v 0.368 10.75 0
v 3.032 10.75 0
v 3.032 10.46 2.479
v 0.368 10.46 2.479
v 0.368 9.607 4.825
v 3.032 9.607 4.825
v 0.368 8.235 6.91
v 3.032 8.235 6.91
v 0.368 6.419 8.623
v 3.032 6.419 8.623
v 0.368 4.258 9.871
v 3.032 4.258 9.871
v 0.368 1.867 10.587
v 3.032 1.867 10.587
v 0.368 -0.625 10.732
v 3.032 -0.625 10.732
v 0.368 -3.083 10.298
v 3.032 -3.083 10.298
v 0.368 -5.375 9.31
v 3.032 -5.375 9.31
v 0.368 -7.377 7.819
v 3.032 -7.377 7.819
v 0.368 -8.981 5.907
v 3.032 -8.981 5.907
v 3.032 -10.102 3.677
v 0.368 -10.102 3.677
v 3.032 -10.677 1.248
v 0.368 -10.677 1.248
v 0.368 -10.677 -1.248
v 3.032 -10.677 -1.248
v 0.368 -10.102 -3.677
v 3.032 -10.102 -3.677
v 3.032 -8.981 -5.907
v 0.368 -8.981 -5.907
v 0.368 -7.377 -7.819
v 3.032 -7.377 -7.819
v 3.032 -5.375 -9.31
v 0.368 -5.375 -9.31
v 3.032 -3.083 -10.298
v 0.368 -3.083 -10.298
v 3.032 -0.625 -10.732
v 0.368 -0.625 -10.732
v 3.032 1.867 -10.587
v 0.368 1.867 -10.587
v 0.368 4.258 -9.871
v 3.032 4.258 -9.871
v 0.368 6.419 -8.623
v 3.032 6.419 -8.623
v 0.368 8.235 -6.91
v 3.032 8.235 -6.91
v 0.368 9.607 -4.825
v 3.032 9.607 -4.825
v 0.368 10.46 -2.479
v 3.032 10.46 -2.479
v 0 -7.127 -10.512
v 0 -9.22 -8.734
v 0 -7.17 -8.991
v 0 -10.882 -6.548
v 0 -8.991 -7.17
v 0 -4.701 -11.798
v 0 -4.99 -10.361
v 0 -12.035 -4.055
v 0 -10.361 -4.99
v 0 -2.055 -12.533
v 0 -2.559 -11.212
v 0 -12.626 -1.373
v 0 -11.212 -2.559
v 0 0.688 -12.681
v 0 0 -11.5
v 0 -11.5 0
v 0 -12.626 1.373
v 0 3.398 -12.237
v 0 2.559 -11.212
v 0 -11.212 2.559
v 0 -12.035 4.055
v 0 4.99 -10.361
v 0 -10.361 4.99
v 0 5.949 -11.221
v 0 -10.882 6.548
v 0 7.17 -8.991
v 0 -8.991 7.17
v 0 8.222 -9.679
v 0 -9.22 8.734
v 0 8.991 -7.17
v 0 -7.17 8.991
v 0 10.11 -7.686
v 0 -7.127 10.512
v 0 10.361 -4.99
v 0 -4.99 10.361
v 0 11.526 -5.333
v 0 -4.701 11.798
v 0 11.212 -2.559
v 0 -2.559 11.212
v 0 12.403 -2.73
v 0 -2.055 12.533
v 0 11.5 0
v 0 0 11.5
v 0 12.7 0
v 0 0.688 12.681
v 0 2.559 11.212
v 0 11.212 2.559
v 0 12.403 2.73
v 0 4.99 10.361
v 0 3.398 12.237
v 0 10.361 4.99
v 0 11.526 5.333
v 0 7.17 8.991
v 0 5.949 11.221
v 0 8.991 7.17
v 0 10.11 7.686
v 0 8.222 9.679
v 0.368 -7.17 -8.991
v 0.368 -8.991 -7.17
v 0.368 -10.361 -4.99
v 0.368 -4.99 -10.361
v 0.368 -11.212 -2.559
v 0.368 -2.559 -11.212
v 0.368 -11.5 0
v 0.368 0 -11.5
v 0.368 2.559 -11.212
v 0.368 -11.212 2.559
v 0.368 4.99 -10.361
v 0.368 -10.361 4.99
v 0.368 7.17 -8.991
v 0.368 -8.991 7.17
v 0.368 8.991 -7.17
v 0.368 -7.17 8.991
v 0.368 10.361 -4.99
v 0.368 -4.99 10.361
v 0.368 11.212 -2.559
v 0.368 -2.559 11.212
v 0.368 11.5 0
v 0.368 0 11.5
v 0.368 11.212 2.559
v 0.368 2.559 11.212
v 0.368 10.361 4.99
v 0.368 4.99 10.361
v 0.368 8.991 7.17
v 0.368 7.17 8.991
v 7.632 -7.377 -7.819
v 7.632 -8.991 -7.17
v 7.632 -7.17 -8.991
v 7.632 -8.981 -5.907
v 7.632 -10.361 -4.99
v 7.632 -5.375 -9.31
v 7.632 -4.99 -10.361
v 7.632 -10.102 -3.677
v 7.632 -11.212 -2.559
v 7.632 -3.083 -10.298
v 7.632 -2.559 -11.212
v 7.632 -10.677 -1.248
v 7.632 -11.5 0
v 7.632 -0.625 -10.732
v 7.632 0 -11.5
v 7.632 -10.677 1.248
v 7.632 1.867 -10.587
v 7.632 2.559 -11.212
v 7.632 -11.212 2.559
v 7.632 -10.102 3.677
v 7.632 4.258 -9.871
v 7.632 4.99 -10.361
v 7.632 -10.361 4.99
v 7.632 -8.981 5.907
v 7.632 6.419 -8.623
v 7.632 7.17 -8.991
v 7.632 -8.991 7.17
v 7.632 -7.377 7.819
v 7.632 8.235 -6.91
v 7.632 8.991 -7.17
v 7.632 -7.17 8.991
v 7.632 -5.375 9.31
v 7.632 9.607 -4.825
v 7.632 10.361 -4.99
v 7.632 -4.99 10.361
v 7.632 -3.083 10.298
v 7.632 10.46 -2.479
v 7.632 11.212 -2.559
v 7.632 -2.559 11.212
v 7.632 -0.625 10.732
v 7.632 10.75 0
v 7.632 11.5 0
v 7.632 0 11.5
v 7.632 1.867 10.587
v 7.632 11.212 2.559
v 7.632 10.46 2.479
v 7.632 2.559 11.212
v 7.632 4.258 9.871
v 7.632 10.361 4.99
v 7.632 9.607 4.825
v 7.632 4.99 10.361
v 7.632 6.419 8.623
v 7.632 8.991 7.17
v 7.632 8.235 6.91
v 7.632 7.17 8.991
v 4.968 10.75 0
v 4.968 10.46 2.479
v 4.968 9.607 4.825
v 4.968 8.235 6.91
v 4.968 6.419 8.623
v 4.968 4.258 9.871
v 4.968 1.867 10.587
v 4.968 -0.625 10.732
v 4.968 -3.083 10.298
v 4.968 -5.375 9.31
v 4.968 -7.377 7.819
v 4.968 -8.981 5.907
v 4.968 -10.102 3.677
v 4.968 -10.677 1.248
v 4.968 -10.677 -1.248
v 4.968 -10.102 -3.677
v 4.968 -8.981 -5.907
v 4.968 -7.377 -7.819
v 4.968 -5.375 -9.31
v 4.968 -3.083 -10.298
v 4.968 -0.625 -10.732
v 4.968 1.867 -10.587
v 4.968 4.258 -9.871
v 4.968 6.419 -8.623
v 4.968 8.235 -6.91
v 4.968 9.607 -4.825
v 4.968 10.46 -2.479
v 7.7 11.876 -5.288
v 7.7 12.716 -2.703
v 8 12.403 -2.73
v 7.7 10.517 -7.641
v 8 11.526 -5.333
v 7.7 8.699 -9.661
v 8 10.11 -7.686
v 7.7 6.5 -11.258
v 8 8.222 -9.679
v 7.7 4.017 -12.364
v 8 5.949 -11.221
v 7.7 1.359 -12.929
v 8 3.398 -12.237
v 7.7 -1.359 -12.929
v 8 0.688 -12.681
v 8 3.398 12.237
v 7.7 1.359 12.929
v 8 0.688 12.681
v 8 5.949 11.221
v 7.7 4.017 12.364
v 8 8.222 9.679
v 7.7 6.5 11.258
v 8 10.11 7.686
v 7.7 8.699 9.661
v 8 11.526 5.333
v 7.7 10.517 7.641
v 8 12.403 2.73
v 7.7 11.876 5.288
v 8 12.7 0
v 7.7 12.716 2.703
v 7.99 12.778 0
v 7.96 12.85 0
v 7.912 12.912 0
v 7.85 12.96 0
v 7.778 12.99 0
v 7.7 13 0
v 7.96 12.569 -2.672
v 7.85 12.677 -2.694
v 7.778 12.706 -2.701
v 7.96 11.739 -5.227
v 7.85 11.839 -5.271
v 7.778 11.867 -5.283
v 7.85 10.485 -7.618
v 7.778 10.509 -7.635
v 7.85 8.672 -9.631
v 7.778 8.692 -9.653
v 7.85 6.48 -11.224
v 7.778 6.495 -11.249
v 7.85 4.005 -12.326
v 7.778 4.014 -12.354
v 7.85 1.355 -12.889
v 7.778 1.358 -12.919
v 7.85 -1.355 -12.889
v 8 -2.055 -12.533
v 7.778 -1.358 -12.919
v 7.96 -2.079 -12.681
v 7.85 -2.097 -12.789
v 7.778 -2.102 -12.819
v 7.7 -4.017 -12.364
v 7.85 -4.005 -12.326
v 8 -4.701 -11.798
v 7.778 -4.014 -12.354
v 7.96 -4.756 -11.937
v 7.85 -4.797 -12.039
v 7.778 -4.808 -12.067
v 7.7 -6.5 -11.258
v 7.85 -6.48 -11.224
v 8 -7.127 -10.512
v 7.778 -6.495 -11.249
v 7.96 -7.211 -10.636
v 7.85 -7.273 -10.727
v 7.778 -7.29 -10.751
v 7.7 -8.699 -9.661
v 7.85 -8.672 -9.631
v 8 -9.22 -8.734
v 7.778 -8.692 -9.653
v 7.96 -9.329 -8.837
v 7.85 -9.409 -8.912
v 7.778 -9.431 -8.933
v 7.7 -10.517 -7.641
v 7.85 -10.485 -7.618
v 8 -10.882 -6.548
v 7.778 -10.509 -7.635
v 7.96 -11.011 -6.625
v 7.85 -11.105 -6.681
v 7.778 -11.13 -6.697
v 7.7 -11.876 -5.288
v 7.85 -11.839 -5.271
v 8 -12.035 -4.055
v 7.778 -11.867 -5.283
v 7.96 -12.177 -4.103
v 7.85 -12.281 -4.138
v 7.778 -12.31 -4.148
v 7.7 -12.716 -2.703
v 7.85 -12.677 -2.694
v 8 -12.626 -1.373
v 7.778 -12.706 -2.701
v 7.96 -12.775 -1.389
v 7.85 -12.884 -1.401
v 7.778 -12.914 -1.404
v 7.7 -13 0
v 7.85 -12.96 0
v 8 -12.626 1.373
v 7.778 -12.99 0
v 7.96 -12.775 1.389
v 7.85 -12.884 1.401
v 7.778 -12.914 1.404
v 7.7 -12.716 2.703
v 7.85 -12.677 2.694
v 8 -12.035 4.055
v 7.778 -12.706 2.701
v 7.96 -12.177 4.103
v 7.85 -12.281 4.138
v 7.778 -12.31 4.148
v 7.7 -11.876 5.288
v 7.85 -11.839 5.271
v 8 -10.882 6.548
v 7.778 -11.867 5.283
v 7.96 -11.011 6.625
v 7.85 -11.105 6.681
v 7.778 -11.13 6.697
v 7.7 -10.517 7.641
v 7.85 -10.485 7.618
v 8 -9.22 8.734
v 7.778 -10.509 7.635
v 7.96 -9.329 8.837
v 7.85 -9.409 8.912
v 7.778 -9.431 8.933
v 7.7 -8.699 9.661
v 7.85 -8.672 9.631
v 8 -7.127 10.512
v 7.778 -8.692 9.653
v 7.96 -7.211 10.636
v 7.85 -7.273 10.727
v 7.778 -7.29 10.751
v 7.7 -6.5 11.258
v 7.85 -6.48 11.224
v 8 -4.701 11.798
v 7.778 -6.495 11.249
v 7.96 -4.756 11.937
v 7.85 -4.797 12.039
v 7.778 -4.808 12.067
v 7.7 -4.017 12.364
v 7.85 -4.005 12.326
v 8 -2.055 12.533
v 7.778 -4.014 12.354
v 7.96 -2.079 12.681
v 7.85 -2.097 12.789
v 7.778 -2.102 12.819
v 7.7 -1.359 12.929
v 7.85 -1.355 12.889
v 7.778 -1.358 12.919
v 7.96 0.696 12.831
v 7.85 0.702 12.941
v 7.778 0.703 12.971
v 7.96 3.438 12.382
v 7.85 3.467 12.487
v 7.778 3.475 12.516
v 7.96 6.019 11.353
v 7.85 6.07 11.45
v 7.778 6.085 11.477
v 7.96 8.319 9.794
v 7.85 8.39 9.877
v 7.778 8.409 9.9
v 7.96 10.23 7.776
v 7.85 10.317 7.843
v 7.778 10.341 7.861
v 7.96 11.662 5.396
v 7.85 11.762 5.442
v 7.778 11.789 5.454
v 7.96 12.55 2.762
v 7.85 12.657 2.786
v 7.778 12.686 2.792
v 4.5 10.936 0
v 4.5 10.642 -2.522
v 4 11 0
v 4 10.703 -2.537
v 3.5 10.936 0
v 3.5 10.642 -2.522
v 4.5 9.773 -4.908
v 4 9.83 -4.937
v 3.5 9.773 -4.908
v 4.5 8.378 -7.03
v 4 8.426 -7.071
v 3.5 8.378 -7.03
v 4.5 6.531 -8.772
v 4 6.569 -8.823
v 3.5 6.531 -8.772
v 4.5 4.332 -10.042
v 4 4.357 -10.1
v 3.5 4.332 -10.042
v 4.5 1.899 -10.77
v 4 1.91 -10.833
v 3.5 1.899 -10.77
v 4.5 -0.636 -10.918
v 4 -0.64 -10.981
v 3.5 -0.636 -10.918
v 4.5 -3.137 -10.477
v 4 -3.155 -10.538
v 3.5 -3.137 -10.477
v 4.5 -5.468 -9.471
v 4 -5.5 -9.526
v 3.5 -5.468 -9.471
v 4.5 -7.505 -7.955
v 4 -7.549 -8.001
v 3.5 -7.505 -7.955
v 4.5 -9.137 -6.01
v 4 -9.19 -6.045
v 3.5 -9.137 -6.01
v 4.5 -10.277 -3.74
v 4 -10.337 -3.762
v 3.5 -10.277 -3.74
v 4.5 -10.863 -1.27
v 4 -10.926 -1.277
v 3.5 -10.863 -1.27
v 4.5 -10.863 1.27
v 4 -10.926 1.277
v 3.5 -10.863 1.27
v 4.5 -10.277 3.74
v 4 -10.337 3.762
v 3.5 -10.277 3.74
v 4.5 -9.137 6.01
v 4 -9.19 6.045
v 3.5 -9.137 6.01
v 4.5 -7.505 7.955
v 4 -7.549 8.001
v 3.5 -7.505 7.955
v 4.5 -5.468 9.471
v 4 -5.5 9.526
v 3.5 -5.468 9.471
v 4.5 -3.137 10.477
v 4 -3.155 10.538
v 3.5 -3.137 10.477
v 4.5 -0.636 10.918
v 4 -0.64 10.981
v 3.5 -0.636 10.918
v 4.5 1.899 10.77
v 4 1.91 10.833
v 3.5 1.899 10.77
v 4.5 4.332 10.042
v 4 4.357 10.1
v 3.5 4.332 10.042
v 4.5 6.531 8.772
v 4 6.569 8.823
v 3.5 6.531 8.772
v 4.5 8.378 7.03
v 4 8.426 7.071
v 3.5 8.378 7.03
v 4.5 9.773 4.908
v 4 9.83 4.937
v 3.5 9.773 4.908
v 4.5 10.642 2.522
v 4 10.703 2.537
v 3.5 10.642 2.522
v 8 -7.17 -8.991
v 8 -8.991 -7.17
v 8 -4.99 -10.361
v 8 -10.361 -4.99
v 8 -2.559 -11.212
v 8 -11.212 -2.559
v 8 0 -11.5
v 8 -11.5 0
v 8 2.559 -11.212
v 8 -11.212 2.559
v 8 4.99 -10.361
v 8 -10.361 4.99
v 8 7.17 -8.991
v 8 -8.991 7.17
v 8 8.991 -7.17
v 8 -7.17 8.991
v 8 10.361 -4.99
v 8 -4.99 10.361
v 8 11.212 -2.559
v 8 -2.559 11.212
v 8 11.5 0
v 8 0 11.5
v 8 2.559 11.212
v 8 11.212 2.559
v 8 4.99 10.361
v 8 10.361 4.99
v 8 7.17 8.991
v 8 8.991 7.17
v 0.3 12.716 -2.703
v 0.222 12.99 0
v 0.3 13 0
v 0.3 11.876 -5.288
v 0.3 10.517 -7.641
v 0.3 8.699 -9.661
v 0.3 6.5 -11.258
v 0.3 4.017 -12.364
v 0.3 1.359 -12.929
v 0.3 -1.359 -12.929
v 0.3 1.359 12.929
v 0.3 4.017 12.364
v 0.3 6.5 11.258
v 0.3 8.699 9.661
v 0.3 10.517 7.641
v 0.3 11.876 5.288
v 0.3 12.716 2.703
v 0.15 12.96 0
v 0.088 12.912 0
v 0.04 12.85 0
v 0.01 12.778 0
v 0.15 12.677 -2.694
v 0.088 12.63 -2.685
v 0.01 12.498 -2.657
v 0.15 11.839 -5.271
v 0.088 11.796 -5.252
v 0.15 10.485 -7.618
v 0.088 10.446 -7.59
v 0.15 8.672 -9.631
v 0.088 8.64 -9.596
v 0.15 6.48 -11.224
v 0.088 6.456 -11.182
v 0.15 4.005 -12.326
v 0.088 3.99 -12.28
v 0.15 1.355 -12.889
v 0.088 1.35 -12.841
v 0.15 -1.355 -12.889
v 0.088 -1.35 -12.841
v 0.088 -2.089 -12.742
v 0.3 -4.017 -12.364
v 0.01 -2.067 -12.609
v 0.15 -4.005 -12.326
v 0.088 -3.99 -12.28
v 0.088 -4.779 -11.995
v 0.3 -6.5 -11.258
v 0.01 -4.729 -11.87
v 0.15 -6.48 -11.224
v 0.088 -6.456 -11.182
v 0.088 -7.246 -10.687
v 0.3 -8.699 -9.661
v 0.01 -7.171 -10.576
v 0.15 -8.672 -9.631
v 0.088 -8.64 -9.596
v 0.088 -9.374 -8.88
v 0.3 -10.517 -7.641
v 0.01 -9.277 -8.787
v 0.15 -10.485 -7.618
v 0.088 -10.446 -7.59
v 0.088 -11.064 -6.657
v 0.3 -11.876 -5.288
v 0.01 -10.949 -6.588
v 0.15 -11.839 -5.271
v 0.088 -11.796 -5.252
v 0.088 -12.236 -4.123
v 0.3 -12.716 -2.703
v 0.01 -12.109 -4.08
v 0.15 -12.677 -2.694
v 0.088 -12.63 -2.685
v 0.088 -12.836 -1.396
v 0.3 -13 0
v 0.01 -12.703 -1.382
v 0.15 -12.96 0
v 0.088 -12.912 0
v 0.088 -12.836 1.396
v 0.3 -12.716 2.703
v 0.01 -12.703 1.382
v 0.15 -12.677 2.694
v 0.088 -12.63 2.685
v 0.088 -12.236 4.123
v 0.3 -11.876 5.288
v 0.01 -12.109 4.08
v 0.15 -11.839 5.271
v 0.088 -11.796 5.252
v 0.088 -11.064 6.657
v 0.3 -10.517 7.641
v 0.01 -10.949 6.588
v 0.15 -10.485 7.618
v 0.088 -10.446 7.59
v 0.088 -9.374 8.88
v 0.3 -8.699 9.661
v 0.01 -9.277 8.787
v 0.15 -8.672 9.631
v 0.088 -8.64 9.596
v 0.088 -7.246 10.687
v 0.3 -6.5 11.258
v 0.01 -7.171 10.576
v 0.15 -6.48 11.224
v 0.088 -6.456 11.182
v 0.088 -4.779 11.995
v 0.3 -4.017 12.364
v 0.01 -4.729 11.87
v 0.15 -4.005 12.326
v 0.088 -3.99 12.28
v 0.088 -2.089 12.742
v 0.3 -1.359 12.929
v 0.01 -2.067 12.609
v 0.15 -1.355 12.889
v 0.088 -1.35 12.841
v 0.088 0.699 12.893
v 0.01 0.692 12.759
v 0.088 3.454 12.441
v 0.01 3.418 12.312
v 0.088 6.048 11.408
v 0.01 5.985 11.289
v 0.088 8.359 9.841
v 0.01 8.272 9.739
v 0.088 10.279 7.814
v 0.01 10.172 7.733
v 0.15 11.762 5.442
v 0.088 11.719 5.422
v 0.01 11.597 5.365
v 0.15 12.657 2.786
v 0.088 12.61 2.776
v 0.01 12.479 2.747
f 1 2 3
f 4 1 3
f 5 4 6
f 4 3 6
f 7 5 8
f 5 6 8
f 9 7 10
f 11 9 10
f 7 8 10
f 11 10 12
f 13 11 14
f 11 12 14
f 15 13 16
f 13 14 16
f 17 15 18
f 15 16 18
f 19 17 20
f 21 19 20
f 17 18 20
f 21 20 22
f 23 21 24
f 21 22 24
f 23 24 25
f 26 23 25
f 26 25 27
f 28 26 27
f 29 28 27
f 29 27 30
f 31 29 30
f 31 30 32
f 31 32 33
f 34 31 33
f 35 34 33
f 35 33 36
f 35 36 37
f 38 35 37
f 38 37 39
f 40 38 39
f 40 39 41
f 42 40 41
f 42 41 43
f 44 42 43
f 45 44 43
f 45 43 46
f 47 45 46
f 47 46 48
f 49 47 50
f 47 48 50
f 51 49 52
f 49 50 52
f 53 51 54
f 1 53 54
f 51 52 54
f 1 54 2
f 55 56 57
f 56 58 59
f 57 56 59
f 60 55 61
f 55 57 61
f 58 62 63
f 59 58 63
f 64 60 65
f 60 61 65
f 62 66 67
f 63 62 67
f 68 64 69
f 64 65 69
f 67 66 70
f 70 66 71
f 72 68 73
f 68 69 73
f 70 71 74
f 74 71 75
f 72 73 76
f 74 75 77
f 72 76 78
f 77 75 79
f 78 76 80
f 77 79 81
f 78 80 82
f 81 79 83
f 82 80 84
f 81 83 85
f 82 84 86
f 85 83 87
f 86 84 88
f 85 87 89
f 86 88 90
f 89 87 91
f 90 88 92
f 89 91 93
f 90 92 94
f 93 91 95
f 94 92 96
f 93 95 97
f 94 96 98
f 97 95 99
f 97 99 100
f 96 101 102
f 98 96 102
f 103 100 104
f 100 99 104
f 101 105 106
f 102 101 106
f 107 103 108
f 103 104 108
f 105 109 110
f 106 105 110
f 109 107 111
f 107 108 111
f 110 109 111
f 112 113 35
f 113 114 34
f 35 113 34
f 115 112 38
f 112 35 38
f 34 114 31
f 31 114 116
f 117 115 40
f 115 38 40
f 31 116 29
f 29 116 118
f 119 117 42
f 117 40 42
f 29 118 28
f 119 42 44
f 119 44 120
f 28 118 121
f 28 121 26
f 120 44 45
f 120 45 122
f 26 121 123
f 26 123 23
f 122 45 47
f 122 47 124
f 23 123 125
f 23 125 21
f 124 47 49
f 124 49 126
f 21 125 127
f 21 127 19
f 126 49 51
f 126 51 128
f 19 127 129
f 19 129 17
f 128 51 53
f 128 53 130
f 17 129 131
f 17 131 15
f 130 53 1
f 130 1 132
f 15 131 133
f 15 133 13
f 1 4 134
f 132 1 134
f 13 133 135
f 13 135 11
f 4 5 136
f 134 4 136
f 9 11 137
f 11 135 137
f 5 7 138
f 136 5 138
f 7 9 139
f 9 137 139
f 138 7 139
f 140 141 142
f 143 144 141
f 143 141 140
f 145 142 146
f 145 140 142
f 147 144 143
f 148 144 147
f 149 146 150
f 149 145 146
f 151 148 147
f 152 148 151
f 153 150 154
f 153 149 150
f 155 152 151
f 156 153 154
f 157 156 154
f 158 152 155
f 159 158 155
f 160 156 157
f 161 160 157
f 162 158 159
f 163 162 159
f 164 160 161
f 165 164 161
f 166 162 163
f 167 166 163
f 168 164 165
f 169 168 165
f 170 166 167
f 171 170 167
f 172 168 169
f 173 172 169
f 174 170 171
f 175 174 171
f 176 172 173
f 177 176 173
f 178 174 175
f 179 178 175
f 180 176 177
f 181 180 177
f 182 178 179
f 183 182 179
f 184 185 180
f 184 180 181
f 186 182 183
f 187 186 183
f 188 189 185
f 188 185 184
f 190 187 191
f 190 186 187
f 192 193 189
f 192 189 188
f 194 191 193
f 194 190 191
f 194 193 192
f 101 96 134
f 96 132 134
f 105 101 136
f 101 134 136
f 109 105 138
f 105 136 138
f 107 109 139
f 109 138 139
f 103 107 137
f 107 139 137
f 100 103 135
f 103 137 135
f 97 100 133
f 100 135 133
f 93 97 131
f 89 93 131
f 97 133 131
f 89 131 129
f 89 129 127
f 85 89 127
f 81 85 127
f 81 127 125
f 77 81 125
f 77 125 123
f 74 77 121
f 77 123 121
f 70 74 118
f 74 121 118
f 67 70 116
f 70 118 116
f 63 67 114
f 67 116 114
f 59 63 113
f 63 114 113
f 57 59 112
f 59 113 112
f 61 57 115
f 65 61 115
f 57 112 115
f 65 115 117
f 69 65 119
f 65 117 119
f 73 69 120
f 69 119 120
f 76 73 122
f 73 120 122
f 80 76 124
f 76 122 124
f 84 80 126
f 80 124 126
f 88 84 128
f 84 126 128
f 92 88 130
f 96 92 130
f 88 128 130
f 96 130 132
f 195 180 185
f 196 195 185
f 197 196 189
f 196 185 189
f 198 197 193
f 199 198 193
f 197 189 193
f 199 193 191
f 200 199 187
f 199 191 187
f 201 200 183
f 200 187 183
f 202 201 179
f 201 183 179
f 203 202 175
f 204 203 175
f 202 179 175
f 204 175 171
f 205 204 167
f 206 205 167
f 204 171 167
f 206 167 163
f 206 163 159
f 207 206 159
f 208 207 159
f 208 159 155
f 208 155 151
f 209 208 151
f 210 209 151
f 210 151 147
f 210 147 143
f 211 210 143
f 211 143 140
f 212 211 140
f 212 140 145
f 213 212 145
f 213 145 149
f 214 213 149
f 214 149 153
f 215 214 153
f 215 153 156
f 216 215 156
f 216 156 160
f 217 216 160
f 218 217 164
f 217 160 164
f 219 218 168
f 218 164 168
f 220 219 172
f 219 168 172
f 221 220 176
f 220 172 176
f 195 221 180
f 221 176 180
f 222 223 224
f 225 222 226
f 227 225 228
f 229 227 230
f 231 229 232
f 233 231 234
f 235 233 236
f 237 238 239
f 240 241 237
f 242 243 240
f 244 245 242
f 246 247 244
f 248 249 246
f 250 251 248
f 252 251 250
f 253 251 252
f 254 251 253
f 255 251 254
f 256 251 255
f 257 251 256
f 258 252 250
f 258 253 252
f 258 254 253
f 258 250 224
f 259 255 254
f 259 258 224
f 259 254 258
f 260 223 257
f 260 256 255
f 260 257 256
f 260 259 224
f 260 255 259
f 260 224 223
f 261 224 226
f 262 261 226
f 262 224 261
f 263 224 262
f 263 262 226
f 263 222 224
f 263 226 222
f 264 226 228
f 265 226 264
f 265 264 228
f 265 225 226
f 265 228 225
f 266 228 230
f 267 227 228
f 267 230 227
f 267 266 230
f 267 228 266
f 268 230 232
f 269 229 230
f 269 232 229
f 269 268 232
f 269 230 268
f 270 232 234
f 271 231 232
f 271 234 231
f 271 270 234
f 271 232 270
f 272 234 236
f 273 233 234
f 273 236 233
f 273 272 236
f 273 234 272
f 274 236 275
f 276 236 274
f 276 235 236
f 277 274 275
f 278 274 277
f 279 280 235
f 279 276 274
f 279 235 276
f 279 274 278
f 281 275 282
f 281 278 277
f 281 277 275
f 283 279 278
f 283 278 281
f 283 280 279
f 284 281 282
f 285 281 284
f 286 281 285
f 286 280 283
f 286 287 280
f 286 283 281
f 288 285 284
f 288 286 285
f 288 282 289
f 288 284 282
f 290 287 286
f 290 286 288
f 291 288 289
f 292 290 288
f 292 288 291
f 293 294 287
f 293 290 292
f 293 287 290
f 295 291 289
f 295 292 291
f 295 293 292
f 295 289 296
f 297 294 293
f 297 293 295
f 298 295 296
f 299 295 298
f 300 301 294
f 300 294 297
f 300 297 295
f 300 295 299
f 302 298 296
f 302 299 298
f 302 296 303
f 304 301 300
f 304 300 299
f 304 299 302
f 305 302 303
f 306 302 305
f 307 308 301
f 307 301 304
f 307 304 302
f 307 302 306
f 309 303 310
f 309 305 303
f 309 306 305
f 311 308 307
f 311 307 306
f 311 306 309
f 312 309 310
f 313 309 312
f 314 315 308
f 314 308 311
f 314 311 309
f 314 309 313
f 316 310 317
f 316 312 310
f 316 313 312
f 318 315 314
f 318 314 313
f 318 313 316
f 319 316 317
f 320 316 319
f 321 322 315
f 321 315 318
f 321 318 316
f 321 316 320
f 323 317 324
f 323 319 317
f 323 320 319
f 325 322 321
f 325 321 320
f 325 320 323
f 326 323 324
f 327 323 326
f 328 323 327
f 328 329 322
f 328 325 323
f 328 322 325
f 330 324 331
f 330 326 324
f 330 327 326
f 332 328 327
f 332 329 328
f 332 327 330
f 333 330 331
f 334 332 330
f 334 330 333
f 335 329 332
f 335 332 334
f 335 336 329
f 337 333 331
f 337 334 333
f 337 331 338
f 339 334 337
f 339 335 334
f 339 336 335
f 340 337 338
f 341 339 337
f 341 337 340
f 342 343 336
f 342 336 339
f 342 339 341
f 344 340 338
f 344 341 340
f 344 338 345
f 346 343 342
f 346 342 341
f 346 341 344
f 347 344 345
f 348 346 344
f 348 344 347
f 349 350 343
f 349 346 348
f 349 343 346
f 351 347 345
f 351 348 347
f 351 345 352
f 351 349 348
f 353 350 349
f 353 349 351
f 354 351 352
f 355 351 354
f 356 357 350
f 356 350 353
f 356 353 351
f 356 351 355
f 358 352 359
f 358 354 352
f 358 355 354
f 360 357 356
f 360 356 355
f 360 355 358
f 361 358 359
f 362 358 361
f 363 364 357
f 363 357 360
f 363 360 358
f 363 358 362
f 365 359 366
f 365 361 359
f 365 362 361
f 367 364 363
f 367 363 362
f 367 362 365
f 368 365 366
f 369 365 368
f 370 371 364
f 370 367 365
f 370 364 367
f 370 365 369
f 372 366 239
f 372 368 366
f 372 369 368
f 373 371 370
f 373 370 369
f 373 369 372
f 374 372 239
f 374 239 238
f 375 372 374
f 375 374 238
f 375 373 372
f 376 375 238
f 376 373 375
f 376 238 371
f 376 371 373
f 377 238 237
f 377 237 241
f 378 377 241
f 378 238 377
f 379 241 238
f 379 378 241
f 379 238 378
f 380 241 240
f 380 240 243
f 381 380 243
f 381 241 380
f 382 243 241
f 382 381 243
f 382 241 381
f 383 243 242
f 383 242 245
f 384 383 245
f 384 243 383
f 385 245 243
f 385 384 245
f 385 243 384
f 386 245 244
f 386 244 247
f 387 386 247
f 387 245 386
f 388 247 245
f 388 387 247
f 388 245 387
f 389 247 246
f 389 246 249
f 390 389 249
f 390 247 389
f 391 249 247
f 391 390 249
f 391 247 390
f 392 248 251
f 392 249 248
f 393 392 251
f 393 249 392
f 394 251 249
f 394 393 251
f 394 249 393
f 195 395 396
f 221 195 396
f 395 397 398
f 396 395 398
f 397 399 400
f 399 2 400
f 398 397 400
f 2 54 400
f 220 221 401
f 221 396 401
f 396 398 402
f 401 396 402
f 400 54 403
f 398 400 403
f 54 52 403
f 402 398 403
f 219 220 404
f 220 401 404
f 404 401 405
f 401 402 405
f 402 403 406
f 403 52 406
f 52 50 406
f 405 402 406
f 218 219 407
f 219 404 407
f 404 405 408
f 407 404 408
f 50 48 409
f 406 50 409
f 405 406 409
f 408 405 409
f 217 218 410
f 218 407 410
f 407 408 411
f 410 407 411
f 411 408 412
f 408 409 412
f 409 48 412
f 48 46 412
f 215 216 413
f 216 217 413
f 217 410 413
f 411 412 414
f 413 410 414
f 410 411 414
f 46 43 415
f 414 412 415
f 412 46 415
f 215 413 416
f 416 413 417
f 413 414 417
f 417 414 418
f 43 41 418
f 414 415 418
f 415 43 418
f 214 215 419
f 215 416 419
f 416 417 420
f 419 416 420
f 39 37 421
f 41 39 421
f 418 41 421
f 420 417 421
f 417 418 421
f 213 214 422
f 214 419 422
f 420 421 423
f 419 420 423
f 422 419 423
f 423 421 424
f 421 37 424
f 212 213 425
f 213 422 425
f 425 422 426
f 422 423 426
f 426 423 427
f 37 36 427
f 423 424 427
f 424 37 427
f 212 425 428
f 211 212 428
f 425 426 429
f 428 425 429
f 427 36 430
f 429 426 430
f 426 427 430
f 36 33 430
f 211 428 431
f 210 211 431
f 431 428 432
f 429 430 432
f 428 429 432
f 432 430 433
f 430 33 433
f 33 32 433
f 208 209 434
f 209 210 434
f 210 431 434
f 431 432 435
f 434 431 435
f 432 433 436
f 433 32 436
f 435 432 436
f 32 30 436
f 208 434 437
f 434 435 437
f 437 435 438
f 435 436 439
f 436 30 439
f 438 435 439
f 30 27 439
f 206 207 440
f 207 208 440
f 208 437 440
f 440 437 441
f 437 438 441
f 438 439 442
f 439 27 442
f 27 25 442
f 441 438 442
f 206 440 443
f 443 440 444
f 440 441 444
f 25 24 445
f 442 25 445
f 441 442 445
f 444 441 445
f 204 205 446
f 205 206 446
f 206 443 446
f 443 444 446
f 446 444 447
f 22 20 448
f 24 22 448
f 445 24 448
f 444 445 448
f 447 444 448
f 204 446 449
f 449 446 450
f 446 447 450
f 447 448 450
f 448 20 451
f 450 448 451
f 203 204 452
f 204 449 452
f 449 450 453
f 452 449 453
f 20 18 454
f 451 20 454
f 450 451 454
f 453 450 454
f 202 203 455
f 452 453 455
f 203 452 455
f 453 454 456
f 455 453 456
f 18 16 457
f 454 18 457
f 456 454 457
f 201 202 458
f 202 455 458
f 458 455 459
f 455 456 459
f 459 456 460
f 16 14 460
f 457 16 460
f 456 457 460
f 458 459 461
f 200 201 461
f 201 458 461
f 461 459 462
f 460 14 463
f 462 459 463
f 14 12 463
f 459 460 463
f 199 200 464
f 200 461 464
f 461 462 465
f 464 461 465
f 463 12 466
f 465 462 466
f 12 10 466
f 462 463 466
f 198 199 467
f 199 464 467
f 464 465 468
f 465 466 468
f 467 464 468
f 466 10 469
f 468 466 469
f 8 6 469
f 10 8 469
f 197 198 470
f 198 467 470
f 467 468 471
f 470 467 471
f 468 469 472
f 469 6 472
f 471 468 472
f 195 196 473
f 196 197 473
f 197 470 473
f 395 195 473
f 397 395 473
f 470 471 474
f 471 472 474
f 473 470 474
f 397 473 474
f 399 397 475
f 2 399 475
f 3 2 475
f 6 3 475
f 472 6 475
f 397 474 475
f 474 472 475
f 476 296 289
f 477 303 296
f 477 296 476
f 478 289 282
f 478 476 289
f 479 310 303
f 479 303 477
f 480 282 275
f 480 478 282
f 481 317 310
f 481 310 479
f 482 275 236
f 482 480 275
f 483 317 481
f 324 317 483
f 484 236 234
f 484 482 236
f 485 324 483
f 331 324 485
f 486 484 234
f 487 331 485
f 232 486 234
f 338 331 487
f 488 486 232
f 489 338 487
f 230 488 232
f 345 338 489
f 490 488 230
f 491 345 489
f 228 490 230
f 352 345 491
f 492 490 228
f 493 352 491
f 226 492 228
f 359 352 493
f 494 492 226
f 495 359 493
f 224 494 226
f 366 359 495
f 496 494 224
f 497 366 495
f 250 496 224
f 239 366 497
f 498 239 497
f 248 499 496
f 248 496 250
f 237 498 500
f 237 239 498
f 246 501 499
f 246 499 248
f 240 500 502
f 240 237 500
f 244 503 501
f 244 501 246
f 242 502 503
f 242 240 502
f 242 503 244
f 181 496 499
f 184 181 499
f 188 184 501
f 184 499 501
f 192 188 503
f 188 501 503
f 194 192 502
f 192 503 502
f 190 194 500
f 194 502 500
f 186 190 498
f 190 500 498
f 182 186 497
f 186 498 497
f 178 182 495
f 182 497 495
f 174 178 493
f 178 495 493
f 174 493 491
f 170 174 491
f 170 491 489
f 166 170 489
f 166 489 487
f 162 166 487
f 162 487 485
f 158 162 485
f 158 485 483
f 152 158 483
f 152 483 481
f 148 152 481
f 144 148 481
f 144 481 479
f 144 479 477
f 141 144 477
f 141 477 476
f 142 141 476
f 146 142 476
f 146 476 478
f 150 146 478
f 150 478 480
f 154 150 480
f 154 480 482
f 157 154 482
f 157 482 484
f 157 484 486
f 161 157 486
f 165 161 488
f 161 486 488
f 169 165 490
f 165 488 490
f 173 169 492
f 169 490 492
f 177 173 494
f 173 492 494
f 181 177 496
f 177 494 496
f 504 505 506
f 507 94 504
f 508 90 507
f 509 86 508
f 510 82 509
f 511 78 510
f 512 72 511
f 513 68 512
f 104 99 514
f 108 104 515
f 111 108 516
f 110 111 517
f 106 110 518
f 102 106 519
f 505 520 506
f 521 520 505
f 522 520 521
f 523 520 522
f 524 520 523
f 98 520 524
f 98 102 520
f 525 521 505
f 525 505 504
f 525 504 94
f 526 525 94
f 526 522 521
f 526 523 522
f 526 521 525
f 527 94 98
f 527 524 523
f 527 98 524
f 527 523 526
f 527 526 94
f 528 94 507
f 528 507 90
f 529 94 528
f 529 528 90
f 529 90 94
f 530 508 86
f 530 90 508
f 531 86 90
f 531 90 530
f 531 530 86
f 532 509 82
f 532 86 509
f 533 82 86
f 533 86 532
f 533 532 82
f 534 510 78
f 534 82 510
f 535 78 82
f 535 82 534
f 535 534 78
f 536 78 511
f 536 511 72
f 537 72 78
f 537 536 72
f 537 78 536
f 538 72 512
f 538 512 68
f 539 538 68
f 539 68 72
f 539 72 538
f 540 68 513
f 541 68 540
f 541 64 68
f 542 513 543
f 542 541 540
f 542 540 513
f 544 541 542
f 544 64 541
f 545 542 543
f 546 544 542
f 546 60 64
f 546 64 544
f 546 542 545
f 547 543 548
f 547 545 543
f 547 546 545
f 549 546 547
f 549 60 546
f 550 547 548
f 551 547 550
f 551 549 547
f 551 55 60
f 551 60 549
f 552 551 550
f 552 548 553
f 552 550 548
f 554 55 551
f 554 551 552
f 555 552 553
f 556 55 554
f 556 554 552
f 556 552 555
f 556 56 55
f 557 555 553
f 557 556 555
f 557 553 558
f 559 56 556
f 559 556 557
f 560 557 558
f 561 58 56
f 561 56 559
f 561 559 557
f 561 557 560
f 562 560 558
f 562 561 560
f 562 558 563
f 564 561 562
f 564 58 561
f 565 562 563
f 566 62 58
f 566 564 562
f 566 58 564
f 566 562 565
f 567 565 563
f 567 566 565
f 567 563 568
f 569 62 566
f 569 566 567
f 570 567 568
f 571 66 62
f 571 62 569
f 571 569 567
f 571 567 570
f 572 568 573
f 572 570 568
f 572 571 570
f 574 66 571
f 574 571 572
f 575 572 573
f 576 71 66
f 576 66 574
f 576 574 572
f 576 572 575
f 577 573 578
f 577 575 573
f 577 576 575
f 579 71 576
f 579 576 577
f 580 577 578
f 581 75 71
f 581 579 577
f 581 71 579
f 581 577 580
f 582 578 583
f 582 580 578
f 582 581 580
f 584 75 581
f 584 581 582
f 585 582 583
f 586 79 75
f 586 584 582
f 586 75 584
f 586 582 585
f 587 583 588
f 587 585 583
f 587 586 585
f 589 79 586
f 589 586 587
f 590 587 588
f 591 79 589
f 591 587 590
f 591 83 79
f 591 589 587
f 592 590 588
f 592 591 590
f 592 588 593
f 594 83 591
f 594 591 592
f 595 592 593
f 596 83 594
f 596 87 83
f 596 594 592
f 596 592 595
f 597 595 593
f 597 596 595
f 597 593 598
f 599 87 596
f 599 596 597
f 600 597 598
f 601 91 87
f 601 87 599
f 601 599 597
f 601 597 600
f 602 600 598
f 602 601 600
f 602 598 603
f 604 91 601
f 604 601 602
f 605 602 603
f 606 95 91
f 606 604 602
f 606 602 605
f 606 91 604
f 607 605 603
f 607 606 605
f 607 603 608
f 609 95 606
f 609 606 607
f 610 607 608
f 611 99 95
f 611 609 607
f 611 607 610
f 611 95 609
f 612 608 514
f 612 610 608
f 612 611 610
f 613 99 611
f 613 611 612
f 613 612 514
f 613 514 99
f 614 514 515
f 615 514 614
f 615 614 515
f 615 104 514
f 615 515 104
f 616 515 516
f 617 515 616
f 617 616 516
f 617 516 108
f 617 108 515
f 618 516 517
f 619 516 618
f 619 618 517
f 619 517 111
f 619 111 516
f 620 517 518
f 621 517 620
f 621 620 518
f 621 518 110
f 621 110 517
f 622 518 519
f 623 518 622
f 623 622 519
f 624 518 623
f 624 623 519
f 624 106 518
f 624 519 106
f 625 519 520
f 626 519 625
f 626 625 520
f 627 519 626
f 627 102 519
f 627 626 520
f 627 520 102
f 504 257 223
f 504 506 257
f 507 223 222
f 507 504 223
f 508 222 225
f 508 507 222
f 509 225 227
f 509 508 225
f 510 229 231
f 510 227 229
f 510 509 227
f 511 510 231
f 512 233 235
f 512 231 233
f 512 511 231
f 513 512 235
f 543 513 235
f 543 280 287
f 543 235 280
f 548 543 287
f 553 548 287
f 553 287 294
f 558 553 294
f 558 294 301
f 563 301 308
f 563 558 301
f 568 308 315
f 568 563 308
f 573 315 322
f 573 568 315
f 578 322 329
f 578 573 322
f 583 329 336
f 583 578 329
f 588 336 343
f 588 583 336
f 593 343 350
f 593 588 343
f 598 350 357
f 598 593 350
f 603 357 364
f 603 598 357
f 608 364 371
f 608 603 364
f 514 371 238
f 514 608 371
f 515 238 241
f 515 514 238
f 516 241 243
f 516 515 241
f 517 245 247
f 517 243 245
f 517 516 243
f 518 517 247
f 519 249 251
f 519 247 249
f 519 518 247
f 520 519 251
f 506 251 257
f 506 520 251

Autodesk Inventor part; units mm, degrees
sketch "Sketch_1" plane through (0, 0, 0) normal (0, 0, 1) x (1, 0, 0)
  line L0 (8, 0) -> (0, 0)
  line L1 (0, 11.5) -> (0.368, 11.5)
  line L2 (0.368, 11.5) -> (0.368, 10.75)
  line L3 (0.368, 10.75) -> (3.0318, 10.75)
  arc A0 (4.9682, 10.75) -> (3.0318, 10.75) centre (4, 9) ccw
  line L4 (4.9682, 10.75) -> (7.632, 10.75)
  line L5 (7.632, 10.75) -> (7.632, 11.5)
  line L6 (7.632, 11.5) -> (8, 11.5)
  line L7 (8, 11.5) -> (8, 12.7)
  arc A1 (8, 12.7) -> (7.7, 13) centre (7.7, 12.7) ccw
  line L8 (7.7, 13) -> (0.3, 13)
  arc A2 (0.3, 13) -> (0, 12.7) centre (0.3, 12.7) ccw
  line L9 (0, 12.7) -> (0, 11.5)
revolve "Revolution1" add sketch "Sketch_1" angle 360 about axis through (8, 0, 0) along (1, 0, 0)
ref_plane "ip_cst_1_or_1_XY" through (0, 0, 0) normal (1, 0, 0) x (0, 0, -1)
ref_plane "ip_cst_1_or_1_YZ" through (0, 0, 0) normal (0, 0, -1) x (0, 1, 0)
ref_plane "ip_cst_1_or_1_ZX" through (0, 0, 0) normal (0, 1, 0) x (1, 0, 0)
ref_plane "ip_cst_1_or_2_XY" through (0, 0, 0) normal (-1, 0, 0) x (0, 0, -1)
ref_plane "ip_cst_1_or_2_YZ" through (0, 0, 0) normal (0, 0, -1) x (0, -1, 0)
ref_plane "ip_cst_1_or_2_ZX" through (0, 0, 0) normal (0, -1, 0) x (-1, 0, 0)
ref_plane "ip_cst_1_or_3_XY" through (0.368, 0, 0) normal (1, 0, 0) x (0, 0, -1)
ref_plane "ip_cst_1_or_3_YZ" through (0.368, 0, 0) normal (0, 0, -1) x (0, 1, 0)
ref_plane "ip_cst_1_or_3_ZX" through (0.368, 0, 0) normal (0, 1, 0) x (1, 0, 0)
ref_plane "ip_cst_1_or_4_XY" through (7.632, 0, 0) normal (-1, 0, 0) x (0, 0, -1)
ref_plane "ip_cst_1_or_4_YZ" through (7.632, 0, 0) normal (0, 0, -1) x (0, -1, 0)
ref_plane "ip_cst_1_or_4_ZX" through (7.632, 0, 0) normal (0, -1, 0) x (-1, 0, 0)
properties part number "6000DDU Outer ring"
